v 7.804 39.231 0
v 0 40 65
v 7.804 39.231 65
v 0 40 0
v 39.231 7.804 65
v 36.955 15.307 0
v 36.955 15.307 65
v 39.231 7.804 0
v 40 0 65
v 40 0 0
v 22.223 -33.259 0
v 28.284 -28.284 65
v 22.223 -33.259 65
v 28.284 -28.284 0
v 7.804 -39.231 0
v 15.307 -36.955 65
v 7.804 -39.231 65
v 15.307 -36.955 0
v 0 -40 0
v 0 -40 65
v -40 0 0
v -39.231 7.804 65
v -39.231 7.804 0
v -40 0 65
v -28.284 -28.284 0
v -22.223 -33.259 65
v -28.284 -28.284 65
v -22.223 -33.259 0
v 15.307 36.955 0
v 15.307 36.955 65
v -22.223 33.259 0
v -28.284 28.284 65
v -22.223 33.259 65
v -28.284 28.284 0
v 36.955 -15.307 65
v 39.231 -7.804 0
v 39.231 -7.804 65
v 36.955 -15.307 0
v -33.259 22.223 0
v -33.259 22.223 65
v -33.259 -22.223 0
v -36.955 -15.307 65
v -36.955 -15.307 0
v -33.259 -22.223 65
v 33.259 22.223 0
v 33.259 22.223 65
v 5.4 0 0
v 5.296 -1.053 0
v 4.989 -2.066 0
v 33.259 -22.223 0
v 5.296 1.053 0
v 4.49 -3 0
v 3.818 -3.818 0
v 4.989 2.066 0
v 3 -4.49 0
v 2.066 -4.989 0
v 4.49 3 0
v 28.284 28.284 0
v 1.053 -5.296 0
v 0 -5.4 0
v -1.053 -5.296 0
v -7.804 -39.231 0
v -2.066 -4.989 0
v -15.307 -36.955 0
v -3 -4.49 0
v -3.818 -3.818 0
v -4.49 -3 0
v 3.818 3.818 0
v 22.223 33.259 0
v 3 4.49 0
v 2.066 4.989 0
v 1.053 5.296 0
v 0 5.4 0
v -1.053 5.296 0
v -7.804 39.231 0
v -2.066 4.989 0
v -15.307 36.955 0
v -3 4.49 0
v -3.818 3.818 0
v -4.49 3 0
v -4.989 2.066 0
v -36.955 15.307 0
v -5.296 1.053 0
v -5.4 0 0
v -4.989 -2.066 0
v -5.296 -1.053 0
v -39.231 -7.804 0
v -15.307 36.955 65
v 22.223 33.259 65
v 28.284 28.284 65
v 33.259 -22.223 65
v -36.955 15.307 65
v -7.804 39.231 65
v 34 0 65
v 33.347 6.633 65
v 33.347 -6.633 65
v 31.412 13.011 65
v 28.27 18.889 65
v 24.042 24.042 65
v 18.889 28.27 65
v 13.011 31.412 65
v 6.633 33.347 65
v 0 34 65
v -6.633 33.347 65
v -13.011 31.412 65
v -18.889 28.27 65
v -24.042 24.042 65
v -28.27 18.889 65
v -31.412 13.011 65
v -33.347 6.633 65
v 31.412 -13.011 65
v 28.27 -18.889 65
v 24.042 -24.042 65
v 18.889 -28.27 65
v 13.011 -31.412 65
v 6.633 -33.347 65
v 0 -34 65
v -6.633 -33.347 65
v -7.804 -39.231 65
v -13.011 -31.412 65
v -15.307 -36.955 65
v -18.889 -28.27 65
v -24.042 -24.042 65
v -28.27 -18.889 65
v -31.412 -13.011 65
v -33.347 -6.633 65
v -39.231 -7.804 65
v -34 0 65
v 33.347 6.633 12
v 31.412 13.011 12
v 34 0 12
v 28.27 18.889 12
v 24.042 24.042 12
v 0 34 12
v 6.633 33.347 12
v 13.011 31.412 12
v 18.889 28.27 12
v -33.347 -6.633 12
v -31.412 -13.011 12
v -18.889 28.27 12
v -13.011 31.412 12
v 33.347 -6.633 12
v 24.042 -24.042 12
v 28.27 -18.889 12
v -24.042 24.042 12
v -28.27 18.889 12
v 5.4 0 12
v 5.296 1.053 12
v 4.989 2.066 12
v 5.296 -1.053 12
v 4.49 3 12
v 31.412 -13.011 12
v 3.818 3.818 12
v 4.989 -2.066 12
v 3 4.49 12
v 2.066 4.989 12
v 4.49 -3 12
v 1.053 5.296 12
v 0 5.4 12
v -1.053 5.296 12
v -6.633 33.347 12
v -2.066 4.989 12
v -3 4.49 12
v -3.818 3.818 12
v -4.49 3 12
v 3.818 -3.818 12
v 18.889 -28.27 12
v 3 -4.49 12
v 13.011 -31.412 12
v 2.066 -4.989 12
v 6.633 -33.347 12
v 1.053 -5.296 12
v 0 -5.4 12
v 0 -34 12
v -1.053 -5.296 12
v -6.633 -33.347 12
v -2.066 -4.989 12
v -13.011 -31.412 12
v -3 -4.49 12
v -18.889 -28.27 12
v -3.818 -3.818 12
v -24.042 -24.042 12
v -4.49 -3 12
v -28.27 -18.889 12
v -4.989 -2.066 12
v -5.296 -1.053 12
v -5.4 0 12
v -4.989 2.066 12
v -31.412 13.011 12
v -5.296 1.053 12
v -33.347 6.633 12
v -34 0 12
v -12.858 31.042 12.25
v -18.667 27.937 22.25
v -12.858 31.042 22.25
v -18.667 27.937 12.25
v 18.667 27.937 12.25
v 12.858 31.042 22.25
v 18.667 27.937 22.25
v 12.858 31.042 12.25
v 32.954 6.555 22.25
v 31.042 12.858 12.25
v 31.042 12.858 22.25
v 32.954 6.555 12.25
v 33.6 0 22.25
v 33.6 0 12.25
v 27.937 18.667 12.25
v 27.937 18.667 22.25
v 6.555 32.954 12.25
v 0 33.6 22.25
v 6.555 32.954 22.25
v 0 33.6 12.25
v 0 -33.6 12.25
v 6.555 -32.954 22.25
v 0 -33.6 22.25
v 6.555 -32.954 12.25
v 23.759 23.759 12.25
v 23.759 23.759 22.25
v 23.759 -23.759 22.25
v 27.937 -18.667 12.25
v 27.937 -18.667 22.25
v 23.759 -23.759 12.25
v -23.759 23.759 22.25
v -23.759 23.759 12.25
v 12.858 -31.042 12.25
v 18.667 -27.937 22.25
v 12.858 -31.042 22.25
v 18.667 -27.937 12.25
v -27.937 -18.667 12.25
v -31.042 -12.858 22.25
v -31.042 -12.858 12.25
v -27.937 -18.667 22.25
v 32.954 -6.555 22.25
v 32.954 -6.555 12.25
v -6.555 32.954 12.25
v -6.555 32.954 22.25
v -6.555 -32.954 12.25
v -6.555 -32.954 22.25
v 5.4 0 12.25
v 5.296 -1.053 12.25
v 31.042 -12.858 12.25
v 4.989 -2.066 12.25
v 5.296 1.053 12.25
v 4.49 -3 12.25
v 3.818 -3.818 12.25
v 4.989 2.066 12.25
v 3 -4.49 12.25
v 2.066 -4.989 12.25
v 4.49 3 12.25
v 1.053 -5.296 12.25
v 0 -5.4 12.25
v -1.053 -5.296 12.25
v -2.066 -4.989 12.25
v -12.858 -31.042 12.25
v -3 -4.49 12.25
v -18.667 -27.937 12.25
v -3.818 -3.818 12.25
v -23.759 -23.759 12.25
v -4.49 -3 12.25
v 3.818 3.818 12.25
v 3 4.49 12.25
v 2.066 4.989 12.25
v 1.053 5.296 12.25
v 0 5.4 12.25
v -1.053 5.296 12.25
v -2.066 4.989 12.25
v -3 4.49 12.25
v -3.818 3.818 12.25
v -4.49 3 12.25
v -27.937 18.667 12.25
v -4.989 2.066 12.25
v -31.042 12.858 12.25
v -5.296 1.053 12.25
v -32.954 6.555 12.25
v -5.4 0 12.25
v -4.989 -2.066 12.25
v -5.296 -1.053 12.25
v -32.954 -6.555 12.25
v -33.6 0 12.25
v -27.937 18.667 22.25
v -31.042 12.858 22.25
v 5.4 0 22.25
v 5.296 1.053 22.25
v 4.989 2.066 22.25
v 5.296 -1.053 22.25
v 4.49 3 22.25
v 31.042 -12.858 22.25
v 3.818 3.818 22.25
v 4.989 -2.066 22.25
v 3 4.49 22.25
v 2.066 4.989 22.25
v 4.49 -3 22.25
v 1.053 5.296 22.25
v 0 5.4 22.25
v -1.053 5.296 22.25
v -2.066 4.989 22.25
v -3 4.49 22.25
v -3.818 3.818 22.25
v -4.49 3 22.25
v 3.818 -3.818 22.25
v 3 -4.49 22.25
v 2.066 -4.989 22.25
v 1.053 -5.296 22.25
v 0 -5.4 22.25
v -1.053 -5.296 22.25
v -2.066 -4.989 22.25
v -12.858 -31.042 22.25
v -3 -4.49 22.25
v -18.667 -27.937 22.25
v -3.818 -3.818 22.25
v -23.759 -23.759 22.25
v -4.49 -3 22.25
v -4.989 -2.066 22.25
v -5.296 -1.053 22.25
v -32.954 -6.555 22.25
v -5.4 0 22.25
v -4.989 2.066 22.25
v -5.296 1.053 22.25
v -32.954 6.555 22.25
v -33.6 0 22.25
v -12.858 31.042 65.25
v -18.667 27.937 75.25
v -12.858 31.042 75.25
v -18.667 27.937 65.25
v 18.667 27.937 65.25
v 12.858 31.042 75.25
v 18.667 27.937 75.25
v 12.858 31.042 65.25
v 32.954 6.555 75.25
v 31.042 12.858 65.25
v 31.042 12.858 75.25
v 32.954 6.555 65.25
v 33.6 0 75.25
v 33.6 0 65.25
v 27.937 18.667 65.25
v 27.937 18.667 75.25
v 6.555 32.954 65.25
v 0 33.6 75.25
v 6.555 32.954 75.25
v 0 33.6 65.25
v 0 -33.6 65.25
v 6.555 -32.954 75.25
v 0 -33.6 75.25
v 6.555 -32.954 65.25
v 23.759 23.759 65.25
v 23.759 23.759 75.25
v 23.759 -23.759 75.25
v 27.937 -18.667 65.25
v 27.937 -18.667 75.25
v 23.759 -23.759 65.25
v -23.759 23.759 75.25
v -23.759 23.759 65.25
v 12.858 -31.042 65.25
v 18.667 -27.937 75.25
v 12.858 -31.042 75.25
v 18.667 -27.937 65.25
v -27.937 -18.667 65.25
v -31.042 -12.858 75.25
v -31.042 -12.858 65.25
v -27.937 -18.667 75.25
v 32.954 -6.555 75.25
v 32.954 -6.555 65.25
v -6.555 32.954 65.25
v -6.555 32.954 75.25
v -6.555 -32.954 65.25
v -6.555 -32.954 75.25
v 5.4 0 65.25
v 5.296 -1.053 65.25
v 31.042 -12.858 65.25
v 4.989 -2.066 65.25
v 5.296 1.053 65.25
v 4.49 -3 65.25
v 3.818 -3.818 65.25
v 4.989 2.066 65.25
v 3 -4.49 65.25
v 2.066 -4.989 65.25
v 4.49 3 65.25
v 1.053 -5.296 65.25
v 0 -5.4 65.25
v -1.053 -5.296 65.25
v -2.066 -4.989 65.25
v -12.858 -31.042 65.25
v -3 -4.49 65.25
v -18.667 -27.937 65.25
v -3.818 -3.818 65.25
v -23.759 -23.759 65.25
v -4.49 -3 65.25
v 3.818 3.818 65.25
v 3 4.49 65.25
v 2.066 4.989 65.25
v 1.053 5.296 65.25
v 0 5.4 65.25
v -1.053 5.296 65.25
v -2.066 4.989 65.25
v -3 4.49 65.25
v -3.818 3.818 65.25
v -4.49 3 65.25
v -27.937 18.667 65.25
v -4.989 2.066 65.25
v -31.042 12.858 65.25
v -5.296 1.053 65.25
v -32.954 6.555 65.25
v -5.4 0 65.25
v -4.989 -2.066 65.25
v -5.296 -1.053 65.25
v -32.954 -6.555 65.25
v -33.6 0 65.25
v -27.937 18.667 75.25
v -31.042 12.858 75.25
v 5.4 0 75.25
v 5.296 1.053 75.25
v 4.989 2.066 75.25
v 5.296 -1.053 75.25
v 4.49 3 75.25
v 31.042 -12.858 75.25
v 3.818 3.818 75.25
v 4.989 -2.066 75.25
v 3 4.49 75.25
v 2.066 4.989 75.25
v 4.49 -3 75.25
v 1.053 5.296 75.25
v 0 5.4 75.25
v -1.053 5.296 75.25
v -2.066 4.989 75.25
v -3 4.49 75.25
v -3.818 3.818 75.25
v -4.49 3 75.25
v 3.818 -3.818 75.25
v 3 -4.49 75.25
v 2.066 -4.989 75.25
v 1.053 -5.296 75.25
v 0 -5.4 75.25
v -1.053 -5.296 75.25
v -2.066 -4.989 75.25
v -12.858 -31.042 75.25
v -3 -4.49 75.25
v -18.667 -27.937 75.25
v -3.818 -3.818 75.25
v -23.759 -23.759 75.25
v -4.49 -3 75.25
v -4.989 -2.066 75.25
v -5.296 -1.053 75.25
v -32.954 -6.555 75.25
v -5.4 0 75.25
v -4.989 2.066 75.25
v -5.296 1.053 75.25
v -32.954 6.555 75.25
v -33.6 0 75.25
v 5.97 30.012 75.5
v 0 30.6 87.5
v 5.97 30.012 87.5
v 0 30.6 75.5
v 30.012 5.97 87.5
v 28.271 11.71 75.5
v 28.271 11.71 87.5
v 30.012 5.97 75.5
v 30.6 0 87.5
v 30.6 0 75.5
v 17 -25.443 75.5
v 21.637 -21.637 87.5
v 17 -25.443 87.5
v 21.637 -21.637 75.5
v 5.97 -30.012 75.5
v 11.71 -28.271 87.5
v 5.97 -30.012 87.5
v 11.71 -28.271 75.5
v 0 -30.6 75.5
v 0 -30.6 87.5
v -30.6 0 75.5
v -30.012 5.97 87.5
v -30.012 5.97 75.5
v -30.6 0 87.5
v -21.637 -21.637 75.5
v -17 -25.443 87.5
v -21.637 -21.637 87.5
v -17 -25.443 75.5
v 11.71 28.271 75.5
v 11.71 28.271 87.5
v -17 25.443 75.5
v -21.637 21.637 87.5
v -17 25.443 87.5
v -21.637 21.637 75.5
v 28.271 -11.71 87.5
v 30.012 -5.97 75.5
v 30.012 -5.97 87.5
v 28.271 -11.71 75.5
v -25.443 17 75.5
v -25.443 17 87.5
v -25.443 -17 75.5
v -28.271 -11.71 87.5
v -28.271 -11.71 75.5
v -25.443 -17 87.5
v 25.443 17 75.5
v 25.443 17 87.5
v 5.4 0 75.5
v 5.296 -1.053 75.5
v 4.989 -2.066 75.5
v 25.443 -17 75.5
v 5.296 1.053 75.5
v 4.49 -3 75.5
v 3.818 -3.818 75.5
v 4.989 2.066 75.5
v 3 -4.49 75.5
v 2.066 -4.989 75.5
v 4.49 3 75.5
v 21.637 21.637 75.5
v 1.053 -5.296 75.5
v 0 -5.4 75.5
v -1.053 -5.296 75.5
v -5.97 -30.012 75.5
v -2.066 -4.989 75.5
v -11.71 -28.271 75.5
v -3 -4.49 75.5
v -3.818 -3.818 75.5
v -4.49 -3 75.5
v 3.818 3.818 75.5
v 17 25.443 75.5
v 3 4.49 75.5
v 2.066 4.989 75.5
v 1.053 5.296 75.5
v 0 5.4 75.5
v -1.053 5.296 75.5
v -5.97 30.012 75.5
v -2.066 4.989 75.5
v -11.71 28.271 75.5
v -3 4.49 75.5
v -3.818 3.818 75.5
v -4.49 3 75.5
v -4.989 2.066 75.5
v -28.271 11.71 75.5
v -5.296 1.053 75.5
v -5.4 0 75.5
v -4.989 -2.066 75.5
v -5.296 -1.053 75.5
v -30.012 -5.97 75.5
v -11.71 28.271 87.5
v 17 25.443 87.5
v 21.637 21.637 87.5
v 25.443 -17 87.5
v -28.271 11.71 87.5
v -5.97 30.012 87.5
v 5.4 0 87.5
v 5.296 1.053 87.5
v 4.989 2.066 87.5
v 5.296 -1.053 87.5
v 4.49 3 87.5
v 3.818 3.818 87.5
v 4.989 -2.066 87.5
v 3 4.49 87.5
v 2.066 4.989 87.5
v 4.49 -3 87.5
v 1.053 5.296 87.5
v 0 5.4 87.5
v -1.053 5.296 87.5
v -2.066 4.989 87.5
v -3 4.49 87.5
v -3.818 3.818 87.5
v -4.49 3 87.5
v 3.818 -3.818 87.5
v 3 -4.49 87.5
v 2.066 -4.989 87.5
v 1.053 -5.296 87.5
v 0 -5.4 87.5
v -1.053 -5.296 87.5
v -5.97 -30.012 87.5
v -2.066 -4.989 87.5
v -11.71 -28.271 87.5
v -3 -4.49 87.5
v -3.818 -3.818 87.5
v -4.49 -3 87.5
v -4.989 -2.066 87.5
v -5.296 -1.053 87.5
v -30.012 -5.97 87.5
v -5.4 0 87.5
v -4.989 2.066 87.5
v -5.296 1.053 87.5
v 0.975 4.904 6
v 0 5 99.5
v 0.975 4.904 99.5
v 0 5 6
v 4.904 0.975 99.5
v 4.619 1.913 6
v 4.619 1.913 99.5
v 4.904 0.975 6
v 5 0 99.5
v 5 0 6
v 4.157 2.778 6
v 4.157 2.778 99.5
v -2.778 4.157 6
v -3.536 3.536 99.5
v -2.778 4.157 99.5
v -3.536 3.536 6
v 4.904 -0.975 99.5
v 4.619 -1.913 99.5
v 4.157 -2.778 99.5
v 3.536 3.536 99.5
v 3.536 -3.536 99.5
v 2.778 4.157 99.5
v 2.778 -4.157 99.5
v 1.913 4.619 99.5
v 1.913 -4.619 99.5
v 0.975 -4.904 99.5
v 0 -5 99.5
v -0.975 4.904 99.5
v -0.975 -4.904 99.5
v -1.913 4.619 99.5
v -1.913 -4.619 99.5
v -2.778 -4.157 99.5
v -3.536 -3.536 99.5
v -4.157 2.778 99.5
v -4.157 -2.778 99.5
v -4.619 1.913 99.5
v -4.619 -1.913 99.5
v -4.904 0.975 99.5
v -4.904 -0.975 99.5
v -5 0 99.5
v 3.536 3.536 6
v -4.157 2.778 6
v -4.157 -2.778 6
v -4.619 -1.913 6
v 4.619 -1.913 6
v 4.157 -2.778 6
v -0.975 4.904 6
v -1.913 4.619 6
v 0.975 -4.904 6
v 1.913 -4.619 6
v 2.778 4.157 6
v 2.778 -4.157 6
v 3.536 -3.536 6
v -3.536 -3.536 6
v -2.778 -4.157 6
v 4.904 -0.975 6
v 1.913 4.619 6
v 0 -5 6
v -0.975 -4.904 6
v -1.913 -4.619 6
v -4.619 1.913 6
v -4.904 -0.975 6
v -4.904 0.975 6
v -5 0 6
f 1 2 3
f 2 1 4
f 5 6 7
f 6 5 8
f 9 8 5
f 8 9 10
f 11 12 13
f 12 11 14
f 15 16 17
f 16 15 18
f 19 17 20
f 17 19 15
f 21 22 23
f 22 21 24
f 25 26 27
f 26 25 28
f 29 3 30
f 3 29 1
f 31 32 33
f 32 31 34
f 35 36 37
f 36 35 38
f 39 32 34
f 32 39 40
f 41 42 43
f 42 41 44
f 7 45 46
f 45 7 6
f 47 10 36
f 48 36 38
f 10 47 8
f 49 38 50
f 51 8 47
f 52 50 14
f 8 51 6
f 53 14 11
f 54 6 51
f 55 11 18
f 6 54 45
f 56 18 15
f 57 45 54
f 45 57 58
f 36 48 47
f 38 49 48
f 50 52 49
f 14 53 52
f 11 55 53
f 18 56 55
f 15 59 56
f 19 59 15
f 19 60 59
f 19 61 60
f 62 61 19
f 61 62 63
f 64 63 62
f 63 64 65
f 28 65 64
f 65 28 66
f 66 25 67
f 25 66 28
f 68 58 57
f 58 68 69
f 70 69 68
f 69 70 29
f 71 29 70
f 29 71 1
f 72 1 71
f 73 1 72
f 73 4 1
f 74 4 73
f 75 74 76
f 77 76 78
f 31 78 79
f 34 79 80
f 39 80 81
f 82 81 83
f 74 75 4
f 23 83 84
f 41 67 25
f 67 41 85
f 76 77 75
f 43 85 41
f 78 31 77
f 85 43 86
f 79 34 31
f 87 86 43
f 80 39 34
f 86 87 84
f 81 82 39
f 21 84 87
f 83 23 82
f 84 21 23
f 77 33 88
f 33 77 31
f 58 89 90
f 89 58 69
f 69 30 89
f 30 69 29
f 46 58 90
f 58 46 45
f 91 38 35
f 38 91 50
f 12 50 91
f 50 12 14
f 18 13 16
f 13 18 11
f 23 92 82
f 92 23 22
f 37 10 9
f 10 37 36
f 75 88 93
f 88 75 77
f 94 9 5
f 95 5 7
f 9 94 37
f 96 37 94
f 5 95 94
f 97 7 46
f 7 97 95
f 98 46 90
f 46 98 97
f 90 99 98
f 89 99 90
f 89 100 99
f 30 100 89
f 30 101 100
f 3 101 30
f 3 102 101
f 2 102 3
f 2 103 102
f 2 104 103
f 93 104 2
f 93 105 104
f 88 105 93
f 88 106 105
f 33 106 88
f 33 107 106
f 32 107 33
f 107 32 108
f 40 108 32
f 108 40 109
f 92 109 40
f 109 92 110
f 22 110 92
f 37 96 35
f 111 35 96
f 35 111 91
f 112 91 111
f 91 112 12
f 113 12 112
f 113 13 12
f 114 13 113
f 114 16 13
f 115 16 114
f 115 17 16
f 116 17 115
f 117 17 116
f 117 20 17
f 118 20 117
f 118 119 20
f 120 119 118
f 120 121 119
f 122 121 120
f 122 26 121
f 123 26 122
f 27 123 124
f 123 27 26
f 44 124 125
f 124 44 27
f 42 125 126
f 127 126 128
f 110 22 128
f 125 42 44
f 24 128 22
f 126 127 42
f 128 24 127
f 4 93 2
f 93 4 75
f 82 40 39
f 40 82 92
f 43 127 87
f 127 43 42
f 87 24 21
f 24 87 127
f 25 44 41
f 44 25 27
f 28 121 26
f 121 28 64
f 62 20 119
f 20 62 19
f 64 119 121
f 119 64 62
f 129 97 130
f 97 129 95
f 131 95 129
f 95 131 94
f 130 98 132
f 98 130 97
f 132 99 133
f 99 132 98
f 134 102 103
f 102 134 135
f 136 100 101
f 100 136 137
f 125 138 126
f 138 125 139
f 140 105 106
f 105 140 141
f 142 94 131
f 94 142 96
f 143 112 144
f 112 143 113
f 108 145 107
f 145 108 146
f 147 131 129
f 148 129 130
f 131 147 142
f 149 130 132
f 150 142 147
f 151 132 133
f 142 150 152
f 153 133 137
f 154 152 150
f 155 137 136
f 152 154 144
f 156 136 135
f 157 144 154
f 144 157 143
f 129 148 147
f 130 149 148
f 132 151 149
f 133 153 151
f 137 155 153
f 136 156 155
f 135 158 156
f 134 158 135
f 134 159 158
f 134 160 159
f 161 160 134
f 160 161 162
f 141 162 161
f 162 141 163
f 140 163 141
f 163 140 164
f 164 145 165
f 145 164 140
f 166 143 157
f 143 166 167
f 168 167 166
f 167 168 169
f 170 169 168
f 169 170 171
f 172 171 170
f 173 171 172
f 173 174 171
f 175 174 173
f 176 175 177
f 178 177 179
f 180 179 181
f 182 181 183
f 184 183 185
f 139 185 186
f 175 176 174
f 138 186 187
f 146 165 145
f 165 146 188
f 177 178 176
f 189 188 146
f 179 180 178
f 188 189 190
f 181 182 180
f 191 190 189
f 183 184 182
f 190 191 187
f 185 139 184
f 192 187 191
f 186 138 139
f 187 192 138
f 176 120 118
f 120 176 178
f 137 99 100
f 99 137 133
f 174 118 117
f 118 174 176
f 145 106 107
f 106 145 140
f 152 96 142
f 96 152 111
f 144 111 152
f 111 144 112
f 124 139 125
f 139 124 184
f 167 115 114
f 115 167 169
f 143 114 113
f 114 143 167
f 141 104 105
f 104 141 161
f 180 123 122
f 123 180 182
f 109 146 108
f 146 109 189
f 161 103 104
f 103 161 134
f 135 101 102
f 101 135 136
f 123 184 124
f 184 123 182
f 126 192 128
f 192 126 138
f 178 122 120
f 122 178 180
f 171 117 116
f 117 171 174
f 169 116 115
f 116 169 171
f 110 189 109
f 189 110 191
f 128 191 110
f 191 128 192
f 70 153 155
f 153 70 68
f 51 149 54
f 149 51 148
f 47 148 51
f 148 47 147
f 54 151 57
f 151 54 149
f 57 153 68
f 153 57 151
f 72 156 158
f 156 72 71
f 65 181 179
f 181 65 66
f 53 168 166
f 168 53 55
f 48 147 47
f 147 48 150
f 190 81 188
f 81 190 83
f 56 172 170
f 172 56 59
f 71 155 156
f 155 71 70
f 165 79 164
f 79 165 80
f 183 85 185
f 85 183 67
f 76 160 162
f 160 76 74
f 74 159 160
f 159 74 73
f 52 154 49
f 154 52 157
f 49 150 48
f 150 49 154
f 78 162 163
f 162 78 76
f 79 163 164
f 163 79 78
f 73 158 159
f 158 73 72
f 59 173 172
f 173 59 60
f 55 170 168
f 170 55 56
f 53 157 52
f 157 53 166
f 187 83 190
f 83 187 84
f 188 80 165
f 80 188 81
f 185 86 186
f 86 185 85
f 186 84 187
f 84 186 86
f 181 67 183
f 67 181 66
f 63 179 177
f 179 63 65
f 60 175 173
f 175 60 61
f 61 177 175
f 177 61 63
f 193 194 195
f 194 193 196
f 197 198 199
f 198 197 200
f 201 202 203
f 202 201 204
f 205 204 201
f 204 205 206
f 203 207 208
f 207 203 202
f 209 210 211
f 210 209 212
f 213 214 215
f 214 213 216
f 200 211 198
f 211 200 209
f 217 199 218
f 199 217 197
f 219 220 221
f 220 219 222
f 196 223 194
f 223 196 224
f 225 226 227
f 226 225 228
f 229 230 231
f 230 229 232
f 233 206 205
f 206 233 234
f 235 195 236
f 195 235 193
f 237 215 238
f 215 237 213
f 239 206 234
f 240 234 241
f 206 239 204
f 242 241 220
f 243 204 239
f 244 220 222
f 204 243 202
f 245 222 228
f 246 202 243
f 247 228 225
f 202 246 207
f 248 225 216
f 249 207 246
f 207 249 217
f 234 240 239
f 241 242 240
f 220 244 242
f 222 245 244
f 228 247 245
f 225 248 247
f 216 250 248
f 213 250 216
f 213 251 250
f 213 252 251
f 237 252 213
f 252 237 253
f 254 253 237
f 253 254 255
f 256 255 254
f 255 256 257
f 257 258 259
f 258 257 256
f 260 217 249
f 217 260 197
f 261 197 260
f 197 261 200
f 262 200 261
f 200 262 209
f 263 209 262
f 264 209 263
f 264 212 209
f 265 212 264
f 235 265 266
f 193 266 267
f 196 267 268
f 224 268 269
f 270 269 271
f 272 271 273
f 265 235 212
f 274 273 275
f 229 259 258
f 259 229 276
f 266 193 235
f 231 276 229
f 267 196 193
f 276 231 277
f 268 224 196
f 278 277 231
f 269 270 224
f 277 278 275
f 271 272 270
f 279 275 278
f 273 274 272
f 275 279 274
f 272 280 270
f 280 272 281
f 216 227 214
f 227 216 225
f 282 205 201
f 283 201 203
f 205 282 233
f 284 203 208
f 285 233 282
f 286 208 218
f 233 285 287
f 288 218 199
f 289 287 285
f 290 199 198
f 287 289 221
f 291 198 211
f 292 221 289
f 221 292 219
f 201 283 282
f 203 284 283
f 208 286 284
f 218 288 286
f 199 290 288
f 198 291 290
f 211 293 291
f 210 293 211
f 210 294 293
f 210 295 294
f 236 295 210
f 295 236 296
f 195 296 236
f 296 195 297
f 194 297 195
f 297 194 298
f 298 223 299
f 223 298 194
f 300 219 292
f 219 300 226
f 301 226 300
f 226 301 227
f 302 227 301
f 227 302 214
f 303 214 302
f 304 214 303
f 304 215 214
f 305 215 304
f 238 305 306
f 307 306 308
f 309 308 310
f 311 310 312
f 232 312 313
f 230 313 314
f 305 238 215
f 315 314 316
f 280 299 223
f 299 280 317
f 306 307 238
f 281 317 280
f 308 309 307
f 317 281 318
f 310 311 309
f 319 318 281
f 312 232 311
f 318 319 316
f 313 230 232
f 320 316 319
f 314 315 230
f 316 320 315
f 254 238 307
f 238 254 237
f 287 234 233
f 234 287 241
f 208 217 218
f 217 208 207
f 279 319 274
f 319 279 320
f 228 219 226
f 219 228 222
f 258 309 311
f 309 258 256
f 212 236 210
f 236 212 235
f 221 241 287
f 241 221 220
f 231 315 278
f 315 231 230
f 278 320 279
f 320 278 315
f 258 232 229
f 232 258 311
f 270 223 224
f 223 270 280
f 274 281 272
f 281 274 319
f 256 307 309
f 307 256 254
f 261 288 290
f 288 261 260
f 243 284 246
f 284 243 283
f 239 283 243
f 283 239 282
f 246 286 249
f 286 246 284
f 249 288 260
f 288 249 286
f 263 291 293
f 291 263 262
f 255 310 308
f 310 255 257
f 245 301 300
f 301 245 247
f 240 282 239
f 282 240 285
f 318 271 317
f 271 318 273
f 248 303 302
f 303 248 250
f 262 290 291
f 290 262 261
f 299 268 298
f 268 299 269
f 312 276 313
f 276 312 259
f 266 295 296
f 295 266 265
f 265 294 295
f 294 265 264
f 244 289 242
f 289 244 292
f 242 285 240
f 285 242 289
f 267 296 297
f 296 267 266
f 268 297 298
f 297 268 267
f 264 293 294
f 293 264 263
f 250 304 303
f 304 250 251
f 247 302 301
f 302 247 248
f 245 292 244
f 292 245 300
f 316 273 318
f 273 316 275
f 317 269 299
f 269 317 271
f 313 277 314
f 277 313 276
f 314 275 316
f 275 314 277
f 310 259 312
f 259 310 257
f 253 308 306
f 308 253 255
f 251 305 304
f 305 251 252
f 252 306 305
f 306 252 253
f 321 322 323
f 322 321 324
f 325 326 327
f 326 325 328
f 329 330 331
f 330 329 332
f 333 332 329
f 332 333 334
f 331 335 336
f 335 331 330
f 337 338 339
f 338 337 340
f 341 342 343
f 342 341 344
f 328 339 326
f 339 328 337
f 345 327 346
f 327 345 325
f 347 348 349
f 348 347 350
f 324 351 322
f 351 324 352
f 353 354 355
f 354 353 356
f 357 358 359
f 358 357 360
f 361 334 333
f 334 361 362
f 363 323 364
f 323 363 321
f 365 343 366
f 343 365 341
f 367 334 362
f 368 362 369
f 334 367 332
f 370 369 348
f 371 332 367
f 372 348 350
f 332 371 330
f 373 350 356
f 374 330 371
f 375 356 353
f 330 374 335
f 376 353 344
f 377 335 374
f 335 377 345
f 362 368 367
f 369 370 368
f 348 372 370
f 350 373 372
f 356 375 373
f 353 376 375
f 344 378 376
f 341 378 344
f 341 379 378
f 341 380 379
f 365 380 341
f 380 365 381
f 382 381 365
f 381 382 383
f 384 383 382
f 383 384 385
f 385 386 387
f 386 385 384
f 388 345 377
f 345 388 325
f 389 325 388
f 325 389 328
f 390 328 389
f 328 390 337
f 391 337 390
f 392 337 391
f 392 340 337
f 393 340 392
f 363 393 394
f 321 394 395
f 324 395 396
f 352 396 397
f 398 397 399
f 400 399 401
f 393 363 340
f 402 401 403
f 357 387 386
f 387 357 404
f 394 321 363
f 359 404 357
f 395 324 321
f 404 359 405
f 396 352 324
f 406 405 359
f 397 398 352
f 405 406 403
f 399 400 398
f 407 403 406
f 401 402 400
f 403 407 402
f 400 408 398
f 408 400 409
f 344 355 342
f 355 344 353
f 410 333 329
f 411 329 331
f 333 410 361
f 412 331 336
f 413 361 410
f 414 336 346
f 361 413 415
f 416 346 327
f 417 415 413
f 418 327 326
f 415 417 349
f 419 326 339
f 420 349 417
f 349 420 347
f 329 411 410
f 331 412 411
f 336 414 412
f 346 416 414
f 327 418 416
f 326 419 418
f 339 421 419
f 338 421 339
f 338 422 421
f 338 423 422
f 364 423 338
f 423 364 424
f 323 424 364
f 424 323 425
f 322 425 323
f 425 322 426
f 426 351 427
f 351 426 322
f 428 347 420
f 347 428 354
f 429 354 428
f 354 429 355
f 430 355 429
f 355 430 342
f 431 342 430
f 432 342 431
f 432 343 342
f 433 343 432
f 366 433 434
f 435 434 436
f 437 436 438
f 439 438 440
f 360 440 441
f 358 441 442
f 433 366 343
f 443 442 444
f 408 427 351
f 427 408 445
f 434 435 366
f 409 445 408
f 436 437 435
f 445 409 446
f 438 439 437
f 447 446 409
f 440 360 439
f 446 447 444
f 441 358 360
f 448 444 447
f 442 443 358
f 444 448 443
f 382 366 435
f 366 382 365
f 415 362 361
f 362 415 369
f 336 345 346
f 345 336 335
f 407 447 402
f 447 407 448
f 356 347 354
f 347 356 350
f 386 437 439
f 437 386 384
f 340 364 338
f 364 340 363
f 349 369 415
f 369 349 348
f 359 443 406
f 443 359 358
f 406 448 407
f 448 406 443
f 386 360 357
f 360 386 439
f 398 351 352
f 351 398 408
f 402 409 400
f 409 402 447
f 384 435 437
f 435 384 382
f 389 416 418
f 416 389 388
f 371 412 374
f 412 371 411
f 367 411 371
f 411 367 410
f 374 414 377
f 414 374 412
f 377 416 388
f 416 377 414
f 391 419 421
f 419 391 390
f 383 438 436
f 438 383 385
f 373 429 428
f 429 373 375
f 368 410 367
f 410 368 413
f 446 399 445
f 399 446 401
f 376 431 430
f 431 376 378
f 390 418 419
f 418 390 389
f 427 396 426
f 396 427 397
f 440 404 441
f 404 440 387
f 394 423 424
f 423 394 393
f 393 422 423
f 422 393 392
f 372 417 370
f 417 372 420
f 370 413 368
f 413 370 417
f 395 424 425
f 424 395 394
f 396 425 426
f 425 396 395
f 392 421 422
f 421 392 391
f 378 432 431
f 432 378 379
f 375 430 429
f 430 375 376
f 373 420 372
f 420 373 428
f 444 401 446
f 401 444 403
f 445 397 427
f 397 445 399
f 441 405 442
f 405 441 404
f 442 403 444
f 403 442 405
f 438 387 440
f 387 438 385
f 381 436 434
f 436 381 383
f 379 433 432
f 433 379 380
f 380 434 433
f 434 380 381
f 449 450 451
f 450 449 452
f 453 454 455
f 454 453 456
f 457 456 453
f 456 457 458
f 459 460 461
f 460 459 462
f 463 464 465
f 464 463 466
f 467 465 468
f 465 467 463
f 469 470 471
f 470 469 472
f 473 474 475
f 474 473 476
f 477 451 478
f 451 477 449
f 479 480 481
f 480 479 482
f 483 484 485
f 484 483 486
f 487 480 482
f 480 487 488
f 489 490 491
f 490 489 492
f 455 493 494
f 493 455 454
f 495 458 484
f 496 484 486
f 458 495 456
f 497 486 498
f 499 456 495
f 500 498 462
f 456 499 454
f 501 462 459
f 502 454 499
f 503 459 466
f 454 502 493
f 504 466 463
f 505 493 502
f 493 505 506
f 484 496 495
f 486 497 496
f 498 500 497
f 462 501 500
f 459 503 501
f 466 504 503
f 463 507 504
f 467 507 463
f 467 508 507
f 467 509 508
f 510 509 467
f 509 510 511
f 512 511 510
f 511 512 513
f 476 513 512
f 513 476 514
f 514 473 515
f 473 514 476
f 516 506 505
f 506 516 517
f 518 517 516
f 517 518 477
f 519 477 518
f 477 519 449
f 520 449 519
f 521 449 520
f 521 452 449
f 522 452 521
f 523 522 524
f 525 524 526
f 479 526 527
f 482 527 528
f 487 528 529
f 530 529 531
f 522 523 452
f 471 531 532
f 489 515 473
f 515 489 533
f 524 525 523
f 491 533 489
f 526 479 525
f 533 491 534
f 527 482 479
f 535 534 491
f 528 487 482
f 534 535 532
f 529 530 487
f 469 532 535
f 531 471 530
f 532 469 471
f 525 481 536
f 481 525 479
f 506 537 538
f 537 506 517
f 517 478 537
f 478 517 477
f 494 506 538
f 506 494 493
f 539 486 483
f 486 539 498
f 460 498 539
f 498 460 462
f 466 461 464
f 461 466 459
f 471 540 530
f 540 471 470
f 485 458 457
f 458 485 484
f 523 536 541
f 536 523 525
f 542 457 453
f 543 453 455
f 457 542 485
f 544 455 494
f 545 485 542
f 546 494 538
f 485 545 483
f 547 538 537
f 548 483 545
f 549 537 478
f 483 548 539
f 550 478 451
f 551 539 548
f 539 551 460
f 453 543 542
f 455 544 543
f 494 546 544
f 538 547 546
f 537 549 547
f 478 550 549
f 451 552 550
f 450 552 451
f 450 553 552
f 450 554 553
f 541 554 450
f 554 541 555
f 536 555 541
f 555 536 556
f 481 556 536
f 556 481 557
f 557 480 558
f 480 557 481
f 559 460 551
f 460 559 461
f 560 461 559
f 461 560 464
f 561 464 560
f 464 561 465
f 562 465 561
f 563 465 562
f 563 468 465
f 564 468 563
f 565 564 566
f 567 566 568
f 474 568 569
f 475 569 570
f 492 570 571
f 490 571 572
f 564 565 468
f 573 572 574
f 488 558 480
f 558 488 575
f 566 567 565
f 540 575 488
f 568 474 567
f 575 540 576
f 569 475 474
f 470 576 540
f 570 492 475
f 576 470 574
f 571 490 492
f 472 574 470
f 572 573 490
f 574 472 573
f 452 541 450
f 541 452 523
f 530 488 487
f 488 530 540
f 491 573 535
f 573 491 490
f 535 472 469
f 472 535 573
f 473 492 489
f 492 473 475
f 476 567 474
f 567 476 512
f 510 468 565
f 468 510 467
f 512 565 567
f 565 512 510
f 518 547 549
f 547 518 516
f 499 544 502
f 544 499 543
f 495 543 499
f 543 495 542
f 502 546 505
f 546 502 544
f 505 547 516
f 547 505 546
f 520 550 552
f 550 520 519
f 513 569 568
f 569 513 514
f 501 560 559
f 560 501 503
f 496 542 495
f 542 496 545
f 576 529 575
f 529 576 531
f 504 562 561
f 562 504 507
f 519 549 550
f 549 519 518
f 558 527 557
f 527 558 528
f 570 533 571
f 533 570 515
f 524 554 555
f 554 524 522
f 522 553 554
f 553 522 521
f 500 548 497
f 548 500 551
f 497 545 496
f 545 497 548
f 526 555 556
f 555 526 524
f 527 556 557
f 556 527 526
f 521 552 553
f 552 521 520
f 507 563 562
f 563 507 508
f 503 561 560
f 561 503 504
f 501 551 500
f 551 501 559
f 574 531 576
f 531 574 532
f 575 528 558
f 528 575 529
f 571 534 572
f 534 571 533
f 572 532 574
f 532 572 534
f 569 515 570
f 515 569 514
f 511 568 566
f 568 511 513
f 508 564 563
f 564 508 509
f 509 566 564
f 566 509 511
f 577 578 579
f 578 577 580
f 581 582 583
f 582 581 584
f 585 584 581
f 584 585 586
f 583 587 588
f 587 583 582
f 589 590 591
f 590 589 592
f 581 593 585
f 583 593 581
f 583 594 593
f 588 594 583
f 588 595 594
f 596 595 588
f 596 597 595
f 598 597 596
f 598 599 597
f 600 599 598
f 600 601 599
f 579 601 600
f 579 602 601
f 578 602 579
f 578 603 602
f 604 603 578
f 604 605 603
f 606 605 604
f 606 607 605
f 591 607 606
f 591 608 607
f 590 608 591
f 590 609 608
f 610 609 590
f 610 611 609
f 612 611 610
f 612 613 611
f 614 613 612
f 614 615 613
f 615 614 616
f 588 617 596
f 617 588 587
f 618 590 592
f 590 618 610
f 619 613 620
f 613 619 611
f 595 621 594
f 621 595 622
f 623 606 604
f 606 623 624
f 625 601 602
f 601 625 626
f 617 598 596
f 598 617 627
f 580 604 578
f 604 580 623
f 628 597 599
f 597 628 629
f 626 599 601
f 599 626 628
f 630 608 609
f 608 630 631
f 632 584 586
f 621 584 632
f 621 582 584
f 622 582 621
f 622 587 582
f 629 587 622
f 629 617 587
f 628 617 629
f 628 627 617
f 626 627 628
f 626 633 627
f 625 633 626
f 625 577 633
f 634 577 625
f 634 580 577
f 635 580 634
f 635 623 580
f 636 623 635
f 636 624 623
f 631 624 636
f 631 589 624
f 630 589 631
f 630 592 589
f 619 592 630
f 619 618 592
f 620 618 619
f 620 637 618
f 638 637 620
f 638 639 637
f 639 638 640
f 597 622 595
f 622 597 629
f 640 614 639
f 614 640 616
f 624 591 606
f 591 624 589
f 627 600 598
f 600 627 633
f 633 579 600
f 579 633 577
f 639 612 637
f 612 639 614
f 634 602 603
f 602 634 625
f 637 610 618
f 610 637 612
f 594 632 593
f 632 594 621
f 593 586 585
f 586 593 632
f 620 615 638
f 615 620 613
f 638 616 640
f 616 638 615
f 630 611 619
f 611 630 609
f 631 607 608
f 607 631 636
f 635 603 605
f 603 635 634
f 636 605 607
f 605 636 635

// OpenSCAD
$fn = 32;

// ------------------------------------------------------------------------
// Bearing housing: housing d80, two bearings and a shaft
// Every part is its own module, assembly() places them once.
// ------------------------------------------------------------------------

// --- part 1 ---
module housing() {
  difference() {
    cylinder(h = 65, d = 80);
    translate([0, 0, 12]) cylinder(h = 54, d = 68);
    translate([0, 0, -1]) cylinder(h = 14, d = 10.8);
  }
}

// --- part 2 ---
module bearing_lower() {
  difference() {
      translate([0, 0, 0]) cylinder(h = 10, d = 67.2);
      translate([0, 0, -1]) cylinder(h = 12, d = 10.8);
    }
}

// --- part 3 ---
module bearing_upper() {
  difference() {
      translate([0, 0, 0]) cylinder(h = 10, d = 67.2);
      translate([0, 0, -1]) cylinder(h = 12, d = 10.8);
    }
}

// --- part 4 ---
module spacer() {
  difference() {
      translate([0, 0, 0]) cylinder(h = 12, d = 61.2);
      translate([0, 0, -1]) cylinder(h = 14, d = 10.8);
    }
}

// --- part 5 ---
module shaft() {
  translate([0, 0, -46.75]) cylinder(h = 93.5, d = 10);
}

// --- assembly ---
module assembly() {
  translate([0, 0, 0]) rotate([0, 0, 0]) housing();
  translate([0, 0, 12.25]) rotate([0, 0, 0]) bearing_lower();
  translate([0, 0, 65.25]) rotate([0, 0, 0]) bearing_upper();
  translate([0, 0, 75.5]) rotate([0, 0, 0]) spacer();
  translate([0, 0, 52.75]) rotate([0, 0, 0]) shaft();
}

assembly();
